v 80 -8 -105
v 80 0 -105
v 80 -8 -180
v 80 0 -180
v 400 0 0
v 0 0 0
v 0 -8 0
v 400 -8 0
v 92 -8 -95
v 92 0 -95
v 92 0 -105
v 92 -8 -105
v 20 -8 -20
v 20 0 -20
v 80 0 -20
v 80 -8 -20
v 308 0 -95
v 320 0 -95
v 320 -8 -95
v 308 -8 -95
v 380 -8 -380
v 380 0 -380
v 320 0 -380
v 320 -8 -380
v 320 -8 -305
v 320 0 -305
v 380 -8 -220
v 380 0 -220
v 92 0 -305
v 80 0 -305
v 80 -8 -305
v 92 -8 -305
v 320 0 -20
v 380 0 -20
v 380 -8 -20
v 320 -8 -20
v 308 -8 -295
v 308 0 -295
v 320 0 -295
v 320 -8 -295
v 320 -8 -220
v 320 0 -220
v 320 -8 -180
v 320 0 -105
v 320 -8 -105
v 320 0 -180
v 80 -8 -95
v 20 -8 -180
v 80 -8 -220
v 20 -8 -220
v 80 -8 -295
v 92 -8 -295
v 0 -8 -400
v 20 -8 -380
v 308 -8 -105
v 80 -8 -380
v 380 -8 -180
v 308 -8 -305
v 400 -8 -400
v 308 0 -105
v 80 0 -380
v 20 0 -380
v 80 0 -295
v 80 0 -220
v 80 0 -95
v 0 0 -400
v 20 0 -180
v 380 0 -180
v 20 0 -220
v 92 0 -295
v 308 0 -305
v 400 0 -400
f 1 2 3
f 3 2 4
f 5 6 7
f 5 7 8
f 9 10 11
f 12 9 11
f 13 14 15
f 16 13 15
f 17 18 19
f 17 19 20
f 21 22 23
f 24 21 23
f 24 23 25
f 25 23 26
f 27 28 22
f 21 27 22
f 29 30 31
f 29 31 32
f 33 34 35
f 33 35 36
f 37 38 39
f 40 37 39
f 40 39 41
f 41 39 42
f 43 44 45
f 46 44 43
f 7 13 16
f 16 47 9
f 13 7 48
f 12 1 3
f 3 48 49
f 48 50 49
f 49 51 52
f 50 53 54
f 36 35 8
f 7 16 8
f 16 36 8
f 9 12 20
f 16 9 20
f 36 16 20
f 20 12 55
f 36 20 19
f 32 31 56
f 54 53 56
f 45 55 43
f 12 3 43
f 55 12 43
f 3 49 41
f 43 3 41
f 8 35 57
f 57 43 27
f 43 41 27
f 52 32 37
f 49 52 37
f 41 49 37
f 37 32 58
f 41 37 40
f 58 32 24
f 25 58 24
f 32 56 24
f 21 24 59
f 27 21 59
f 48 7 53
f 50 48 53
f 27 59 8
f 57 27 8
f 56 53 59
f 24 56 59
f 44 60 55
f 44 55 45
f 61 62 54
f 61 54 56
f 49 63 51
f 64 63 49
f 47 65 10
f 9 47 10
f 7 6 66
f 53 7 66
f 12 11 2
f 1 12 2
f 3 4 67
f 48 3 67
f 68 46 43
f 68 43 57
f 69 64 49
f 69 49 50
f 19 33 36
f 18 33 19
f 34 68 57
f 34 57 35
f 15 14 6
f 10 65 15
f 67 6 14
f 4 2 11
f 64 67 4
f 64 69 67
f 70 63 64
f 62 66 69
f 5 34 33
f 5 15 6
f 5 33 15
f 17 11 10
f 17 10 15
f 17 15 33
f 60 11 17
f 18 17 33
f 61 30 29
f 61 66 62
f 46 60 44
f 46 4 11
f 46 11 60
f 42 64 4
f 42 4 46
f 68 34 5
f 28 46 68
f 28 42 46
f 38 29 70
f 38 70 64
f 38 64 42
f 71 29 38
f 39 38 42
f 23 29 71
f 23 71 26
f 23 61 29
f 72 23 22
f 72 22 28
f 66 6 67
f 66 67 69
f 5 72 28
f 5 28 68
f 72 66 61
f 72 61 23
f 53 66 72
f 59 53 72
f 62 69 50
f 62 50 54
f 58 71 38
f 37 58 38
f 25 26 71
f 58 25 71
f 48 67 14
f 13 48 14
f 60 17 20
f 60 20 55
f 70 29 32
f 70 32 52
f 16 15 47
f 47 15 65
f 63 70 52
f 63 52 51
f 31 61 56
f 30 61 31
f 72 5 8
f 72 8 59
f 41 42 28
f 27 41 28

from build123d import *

# Parameters (mm, degrees)
SKETCH1_W          = 400
SKETCH1_H          = 400
BASE_FLANGE1_DEPTH = 8
CUT_EXTRUDE1_DEPTH = 10


# Sheet-metal steps are written as plain solids
with BuildPart() as part:
    # Sketch1 → Base-Flange1 (new body)
    with BuildSketch(Plane(origin=(0, 0, 0), x_dir=(1, 0, 0), z_dir=(0, 1, 0))):
        with Locations((200, 200)):
            Rectangle(SKETCH1_W, SKETCH1_H)
    extrude(amount=-BASE_FLANGE1_DEPTH)

    # Sketch2 → Cut-Extrude1 (cut)
    with BuildSketch(Plane(origin=(0, 0, 0), x_dir=(1, 0, 0), z_dir=(0, 1, 0))):
        Polygon((80, 295), (80, 220), (20, 220), (20, 380), (80, 380), (80, 305), (92, 305), (92, 295), align=None)
        Polygon((92, 105), (80, 105), (80, 180), (20, 180), (20, 20), (80, 20), (80, 95), (92, 95), align=None)
        Polygon((320, 105), (320, 180), (380, 180), (380, 20), (320, 20), (320, 95), (308, 95), (308, 105), align=None)
        Polygon((308, 295), (320, 295), (320, 220), (380, 220), (380, 380), (320, 380), (320, 305), (308, 305), align=None)
    extrude(amount=-CUT_EXTRUDE1_DEPTH, mode=Mode.SUBTRACT)


solid = part.part
